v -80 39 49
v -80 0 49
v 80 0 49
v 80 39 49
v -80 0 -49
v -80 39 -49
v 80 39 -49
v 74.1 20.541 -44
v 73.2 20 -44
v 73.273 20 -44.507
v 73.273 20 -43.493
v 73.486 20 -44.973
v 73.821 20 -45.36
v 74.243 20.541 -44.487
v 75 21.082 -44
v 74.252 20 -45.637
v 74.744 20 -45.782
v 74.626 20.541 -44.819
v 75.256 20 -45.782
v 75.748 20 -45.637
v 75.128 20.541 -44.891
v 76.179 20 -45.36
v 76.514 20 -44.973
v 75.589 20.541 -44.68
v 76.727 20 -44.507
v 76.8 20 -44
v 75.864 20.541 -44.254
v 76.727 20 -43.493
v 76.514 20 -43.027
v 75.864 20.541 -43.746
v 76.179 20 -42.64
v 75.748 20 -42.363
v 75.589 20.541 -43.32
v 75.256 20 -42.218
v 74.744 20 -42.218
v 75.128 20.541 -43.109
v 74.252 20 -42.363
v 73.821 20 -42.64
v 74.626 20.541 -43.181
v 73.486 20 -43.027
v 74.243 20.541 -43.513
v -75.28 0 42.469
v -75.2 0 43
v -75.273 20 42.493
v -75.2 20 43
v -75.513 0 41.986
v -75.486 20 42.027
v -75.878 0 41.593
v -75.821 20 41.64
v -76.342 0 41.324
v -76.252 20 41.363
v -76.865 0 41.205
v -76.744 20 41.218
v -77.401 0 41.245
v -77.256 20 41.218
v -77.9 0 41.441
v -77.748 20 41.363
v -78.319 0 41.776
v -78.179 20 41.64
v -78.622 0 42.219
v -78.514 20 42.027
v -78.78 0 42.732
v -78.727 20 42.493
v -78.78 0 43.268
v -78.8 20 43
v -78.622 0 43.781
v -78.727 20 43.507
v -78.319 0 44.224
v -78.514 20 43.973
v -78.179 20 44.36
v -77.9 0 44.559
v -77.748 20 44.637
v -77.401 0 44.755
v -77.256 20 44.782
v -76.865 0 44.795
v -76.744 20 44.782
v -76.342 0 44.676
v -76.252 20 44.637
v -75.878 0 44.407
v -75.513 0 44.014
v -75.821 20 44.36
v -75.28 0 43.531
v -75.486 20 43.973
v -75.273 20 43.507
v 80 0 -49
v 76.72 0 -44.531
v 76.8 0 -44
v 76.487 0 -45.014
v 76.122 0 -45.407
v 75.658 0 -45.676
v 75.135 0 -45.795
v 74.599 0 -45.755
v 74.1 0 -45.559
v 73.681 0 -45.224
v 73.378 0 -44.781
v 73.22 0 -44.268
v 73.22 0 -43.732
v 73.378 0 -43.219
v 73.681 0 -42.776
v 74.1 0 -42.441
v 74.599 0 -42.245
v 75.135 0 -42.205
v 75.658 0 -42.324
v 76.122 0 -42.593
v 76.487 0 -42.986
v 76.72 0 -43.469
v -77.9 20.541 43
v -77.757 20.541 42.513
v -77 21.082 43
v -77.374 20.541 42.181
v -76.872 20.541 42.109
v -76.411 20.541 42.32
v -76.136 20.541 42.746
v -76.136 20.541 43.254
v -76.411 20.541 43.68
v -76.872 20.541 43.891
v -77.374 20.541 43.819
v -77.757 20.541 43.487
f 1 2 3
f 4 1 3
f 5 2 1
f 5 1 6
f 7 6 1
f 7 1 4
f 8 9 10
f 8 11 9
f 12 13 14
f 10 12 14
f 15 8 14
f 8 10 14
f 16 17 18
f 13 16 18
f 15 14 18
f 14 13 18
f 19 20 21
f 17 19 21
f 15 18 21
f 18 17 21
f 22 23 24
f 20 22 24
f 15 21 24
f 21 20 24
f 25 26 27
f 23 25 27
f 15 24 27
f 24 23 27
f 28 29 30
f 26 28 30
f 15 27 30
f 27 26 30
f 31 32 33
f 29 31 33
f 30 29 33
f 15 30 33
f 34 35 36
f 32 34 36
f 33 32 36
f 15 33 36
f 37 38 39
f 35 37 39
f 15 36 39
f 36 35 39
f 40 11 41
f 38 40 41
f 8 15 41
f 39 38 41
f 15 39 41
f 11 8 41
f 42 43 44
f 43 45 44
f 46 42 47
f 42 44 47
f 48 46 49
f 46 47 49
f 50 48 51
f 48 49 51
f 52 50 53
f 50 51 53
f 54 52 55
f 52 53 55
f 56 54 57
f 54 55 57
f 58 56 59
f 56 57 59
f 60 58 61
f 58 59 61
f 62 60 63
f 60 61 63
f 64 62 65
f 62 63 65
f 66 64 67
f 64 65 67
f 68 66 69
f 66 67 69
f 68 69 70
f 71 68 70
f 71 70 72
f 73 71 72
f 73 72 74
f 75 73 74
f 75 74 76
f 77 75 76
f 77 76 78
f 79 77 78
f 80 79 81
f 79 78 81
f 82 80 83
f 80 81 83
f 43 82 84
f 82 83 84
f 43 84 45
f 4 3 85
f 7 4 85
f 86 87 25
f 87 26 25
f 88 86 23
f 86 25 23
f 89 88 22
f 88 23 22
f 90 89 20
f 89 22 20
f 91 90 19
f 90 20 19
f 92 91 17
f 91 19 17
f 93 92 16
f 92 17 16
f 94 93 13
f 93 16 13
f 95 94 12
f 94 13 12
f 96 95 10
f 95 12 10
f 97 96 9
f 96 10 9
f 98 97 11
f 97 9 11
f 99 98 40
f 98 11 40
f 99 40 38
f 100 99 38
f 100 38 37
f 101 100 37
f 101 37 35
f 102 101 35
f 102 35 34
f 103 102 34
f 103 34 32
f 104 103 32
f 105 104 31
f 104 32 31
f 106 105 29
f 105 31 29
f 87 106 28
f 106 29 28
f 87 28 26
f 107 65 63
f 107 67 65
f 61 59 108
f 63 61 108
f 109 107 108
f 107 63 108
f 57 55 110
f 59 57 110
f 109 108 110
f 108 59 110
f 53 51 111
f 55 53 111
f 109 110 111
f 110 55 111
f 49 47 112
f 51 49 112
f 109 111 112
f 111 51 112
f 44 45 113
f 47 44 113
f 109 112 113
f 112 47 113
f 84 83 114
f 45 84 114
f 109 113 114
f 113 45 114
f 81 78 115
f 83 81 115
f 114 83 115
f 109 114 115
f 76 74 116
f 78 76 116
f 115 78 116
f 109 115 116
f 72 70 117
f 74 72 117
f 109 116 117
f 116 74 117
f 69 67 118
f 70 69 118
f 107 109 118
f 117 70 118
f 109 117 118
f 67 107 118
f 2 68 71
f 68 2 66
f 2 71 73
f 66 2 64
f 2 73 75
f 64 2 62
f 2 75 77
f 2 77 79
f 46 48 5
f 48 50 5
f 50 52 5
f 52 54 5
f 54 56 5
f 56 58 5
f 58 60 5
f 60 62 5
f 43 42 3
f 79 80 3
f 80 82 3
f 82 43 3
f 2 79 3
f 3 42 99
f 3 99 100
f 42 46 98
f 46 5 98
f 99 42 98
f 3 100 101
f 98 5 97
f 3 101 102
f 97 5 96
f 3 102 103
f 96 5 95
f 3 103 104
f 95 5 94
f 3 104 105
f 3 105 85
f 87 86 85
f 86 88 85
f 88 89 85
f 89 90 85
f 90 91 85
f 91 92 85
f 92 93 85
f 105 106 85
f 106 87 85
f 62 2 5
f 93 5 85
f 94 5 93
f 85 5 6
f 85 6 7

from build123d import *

# Parameters (mm, degrees)
SKETCH1_W                = 160
SKETCH1_H                = 98
BOSS_EXTRUDE1_DEPTH      = 39
M3_CLEARANCE_HOLE1_D     = 3.6
M3_CLEARANCE_HOLE1_DEPTH = 20
M3_CLEARANCE_HOLE1_TIP   = 1.081549114


with BuildPart() as part:
    # Sketch1 → Boss-Extrude1 (new body)
    with BuildSketch(Plane(origin=(0, 0, 0), x_dir=(1, 0, 0), z_dir=(0, 1, 0))):
        Rectangle(SKETCH1_W, SKETCH1_H)
    extrude(amount=BOSS_EXTRUDE1_DEPTH)

    # M3 Clearance Hole1
    with Locations(Plane(origin=(0, 0, 0), x_dir=(-1, 0, 0), z_dir=(0, -1, 0))):
        with Locations((-75, 44), (77, -43)):
            Hole(M3_CLEARANCE_HOLE1_D / 2, depth=M3_CLEARANCE_HOLE1_DEPTH)
            with Locations((0, 0, -(M3_CLEARANCE_HOLE1_DEPTH + M3_CLEARANCE_HOLE1_TIP / 2))):  # 118° drill point
                Cone(0, M3_CLEARANCE_HOLE1_D / 2, M3_CLEARANCE_HOLE1_TIP, mode=Mode.SUBTRACT)


solid = part.part
